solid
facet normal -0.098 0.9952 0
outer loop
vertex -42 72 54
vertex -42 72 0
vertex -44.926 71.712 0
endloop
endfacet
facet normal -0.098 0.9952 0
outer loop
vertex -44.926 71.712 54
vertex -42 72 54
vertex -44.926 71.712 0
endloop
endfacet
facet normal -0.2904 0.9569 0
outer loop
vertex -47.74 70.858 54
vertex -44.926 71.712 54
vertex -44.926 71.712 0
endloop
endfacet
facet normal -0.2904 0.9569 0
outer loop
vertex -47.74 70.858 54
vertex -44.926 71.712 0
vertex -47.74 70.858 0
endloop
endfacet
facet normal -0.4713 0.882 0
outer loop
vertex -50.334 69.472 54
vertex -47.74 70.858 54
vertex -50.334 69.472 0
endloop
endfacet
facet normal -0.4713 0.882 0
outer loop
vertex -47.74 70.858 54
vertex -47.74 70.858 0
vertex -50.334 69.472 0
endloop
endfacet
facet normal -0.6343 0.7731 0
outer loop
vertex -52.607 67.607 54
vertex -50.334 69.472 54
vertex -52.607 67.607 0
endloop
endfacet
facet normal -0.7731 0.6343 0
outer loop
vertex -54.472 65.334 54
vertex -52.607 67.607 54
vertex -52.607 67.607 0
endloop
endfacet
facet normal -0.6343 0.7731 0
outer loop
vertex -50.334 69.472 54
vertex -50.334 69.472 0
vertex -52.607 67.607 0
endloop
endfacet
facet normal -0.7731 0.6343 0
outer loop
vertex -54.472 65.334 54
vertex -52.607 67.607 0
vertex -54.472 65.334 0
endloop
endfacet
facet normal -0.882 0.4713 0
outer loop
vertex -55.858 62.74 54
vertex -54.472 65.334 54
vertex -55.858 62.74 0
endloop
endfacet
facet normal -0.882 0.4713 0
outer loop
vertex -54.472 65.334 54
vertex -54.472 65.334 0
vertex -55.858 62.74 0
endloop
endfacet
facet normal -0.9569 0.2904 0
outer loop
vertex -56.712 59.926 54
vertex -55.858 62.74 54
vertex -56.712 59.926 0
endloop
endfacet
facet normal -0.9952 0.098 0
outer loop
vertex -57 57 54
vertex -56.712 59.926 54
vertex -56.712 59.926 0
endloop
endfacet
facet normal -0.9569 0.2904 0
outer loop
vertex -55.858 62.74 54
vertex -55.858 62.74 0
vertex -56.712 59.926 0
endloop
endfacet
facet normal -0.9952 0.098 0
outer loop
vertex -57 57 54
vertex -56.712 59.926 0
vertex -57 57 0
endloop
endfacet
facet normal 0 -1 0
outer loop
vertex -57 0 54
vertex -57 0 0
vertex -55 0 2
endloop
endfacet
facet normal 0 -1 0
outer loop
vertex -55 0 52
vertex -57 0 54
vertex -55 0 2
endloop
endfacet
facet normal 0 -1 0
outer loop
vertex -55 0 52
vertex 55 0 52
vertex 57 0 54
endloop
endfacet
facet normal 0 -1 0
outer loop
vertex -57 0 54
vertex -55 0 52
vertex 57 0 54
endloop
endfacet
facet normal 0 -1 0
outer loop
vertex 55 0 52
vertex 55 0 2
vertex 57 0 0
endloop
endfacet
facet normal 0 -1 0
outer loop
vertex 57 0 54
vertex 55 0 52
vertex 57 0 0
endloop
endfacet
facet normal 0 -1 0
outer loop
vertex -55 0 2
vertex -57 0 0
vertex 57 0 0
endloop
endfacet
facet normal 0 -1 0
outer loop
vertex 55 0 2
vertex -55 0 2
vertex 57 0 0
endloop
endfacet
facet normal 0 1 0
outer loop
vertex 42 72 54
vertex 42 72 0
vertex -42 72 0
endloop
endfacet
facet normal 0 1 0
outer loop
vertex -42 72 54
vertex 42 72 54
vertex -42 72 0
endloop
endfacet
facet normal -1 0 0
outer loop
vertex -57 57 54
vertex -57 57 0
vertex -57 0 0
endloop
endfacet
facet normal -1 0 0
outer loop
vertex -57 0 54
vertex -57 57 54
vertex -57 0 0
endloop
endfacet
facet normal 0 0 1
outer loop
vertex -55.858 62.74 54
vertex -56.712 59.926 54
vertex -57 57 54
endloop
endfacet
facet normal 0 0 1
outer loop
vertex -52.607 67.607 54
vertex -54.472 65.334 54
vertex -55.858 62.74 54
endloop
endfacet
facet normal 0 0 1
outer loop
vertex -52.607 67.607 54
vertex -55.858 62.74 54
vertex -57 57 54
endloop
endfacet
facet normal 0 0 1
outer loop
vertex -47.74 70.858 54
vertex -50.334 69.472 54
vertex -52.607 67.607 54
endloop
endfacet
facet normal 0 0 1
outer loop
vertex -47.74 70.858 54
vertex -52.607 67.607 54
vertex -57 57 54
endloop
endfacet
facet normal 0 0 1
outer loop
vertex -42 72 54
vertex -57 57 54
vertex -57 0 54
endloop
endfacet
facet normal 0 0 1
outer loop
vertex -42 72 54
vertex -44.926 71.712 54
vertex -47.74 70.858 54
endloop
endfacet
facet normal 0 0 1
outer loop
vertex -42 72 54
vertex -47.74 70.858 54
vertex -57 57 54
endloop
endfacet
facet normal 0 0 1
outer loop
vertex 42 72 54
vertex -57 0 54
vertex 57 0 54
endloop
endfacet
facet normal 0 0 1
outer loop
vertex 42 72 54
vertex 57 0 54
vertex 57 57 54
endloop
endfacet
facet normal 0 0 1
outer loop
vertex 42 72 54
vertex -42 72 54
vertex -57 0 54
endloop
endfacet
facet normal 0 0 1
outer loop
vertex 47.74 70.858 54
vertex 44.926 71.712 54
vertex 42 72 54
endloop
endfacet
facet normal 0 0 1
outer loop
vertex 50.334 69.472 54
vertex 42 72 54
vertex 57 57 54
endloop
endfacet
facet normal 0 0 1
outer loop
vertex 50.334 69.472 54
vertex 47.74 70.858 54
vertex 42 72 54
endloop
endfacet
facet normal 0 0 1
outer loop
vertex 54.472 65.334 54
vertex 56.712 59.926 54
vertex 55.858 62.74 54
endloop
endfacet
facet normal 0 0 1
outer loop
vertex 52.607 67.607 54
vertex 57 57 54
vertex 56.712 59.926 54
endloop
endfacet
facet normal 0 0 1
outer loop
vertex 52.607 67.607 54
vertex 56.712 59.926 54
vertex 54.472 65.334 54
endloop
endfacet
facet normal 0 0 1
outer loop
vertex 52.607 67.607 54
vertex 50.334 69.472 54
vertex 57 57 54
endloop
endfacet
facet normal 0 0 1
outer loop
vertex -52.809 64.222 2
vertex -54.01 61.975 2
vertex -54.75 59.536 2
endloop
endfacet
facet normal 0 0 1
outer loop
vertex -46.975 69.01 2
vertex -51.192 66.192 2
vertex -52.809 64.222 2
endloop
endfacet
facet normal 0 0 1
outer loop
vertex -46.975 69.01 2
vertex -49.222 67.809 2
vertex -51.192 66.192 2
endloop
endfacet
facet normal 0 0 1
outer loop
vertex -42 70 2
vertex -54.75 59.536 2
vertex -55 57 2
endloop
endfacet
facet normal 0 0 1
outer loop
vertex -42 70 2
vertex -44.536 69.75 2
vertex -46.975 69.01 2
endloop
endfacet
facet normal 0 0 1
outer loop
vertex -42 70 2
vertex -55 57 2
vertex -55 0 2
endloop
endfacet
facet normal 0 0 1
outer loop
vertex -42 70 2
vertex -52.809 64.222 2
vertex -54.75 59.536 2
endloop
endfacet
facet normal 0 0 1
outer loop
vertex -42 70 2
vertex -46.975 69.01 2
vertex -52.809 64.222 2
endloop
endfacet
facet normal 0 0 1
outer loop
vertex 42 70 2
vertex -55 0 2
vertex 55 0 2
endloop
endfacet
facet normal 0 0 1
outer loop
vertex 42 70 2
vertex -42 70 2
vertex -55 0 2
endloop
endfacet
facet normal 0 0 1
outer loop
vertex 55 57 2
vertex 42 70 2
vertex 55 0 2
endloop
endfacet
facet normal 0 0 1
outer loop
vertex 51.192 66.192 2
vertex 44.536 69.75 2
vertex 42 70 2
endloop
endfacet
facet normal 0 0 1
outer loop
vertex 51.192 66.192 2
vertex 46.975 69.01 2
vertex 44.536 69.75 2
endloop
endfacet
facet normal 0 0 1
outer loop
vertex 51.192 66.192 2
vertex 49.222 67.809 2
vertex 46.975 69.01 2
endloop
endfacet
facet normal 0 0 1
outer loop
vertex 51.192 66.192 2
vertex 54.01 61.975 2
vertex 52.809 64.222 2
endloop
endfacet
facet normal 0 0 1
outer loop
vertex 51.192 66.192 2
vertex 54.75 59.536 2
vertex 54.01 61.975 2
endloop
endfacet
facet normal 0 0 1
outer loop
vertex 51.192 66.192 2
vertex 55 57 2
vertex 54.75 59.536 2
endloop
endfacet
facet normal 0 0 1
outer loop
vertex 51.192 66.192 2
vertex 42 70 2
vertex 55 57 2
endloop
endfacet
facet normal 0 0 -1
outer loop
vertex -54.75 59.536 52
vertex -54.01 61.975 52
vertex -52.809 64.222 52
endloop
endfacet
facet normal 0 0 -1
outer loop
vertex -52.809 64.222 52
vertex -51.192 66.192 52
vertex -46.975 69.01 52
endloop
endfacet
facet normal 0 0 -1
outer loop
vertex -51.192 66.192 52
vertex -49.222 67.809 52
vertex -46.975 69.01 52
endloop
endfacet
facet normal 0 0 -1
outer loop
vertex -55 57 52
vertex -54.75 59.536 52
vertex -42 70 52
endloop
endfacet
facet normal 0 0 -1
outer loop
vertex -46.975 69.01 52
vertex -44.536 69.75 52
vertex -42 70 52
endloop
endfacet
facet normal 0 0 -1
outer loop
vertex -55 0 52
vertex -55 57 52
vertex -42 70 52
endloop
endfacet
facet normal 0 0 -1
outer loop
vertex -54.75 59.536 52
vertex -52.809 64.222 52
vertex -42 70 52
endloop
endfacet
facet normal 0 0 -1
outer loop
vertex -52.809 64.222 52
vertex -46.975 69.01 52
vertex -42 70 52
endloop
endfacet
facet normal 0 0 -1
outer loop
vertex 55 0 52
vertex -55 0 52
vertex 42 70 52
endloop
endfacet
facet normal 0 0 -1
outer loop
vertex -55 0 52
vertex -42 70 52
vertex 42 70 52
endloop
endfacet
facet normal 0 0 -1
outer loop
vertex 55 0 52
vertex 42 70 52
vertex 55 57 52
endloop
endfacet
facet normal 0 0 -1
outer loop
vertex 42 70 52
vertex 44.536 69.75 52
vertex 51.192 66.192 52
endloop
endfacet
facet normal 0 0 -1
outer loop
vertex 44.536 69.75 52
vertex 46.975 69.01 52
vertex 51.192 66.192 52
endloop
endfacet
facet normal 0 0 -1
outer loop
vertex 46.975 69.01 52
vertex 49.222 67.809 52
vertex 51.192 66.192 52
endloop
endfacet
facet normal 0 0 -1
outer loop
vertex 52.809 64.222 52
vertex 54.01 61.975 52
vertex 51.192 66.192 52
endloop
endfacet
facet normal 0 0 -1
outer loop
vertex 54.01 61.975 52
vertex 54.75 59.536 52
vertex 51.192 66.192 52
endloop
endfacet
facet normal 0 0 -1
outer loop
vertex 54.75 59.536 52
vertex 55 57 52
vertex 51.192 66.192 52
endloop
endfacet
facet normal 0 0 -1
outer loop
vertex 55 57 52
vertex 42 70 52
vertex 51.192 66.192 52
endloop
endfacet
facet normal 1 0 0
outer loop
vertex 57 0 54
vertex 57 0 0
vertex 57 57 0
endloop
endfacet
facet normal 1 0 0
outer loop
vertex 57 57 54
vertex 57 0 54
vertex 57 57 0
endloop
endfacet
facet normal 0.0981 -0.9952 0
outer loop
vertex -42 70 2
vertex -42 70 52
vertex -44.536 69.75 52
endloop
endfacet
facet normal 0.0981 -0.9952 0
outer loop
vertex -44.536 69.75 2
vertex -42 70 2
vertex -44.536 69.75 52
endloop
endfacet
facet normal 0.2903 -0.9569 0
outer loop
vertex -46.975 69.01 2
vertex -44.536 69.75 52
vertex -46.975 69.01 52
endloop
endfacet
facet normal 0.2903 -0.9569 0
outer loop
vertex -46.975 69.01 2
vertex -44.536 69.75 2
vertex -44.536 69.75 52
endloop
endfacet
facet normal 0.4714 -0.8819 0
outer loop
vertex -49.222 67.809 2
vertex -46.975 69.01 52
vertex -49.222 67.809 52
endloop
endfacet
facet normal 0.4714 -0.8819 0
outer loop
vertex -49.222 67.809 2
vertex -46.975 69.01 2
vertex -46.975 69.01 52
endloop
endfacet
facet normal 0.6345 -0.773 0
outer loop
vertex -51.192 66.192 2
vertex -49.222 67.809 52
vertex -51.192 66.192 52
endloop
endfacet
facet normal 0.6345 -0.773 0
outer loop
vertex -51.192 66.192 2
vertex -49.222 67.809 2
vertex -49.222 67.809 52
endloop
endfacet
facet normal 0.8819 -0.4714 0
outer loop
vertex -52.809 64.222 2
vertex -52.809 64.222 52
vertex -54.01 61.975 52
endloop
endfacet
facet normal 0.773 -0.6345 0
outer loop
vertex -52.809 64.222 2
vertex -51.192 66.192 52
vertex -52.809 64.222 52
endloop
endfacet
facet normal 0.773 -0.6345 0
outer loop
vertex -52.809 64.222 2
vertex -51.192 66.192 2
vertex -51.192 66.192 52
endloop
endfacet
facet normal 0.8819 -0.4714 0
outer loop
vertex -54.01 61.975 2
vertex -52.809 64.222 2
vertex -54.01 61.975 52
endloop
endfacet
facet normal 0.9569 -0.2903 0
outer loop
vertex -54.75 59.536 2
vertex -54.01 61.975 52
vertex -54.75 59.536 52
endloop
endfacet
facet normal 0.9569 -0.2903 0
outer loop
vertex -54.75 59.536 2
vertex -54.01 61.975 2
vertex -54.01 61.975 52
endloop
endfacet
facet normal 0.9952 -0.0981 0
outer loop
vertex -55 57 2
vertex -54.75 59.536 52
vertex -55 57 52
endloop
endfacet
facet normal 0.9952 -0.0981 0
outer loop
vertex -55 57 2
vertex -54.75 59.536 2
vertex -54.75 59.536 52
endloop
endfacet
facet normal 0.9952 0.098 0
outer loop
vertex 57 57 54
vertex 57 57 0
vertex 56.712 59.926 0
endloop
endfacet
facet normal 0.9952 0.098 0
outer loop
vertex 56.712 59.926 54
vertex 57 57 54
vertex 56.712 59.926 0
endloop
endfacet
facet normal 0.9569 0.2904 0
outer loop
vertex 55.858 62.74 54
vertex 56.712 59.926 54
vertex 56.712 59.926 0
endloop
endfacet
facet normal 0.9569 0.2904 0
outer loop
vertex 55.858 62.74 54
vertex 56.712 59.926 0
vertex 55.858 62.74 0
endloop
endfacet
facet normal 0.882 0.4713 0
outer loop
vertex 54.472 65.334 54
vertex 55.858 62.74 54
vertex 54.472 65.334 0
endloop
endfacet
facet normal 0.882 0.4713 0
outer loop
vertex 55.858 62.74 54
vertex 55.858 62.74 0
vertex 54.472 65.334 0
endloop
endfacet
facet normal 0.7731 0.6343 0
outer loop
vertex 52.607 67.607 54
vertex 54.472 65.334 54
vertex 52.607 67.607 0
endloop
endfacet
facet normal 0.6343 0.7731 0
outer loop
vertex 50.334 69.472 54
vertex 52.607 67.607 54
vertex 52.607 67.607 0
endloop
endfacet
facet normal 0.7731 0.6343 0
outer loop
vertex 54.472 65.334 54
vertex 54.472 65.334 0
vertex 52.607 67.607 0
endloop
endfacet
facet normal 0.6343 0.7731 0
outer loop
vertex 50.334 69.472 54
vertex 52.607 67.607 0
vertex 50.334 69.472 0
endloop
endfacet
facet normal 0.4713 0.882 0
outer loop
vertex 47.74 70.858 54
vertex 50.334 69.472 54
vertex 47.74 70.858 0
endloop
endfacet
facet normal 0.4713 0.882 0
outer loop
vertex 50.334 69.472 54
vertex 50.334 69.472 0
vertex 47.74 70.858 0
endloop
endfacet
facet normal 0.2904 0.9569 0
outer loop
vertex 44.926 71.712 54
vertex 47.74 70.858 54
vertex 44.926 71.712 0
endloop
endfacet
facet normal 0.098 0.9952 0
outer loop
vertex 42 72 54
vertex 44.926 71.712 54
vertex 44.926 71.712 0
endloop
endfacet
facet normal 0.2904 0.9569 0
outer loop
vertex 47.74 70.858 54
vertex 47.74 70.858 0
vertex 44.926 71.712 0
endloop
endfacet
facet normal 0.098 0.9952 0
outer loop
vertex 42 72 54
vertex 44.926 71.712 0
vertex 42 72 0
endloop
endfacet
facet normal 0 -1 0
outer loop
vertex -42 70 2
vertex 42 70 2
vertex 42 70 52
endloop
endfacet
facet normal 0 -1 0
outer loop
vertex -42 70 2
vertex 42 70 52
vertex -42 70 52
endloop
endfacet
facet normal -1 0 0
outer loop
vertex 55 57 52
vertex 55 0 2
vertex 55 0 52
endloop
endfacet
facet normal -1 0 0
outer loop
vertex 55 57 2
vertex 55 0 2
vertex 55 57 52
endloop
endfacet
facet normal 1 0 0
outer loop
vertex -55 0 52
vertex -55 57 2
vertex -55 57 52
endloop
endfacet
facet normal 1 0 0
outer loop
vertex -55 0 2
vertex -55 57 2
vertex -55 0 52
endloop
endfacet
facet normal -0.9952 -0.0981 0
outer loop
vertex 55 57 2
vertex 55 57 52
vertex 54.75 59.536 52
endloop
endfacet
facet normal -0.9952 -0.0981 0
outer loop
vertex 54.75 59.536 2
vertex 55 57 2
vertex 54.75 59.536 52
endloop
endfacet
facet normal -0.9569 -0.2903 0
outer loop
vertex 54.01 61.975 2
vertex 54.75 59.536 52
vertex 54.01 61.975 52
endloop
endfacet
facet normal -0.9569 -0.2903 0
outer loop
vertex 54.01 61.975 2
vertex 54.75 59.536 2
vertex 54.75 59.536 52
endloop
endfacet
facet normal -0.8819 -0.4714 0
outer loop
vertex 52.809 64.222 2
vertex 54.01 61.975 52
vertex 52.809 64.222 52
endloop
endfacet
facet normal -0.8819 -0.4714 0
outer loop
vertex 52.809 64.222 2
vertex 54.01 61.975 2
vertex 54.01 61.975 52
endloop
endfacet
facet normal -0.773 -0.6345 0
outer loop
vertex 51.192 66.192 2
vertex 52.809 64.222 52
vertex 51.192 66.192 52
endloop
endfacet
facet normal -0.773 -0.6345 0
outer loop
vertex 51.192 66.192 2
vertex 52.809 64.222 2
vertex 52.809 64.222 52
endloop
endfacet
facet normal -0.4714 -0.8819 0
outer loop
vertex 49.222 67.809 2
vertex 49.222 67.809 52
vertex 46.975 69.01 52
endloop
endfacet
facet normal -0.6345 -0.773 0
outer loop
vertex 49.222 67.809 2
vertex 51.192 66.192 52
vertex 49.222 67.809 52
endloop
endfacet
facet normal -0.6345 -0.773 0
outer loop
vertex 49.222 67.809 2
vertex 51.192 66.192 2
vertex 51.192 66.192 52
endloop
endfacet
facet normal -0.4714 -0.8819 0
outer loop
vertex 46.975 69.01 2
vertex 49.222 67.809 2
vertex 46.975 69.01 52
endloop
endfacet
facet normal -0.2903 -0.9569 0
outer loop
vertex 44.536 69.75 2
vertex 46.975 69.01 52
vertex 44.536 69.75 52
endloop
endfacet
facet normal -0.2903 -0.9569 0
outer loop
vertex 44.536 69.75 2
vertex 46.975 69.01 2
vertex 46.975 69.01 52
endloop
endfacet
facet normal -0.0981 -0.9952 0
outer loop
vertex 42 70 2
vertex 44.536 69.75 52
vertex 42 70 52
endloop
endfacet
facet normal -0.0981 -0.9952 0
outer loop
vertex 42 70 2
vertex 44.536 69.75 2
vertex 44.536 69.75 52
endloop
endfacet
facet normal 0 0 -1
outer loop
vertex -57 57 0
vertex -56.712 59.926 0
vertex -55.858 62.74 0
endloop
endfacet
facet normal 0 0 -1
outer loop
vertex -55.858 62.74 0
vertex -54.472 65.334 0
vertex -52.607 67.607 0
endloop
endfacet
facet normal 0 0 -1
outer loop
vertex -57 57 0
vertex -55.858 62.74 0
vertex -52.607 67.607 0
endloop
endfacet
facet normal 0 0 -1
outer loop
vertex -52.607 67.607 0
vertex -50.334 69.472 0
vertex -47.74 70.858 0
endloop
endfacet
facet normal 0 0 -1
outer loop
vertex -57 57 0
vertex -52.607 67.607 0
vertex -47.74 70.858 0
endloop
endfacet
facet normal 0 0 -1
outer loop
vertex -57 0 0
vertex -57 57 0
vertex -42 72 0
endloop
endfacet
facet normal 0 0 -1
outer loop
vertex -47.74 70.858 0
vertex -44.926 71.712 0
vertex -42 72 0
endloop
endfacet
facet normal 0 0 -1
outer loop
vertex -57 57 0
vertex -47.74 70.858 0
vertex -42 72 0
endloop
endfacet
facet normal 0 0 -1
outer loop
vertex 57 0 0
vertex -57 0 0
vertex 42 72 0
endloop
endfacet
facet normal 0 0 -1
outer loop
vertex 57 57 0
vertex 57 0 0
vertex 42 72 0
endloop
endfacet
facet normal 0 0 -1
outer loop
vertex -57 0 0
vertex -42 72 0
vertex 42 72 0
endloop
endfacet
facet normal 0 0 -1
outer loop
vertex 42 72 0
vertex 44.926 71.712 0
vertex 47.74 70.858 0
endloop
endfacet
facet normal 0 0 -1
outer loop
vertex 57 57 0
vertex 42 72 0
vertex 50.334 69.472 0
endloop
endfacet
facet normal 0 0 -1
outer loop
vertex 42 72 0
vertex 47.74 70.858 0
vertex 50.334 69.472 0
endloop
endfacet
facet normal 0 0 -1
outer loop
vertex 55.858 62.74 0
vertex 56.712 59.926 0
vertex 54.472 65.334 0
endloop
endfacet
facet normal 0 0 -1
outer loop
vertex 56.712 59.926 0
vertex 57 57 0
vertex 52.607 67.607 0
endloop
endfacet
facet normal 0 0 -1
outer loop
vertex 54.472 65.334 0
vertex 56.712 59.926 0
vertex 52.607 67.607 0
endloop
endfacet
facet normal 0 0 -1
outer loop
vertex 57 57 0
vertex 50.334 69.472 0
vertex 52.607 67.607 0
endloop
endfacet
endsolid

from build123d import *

# Parameters (mm, degrees)
F1_DEPTH = 54
F2_T     = -2


with BuildPart() as f1:
    # F0 (on Top) → F1 (new body)
    with BuildSketch(Plane.XY):
        with BuildLine():
            Line((-57, 57), (-57, 0))
            Line((-57, 0), (0, 0))
            Line((0, 0), (57, 0))
            Line((57, 0), (57, 57))
            ThreePointArc((57, 57), (52.606602, 67.606602), (42, 72))
            Line((42, 72), (0, 72))
            Line((0, 72), (-42, 72))
            ThreePointArc((-42, 72), (-52.606602, 67.606602), (-57, 57))
        make_face()
    extrude(amount=F1_DEPTH)

    # F2
    f2_openings = [f1.faces().sort_by_distance(p)[0] for p in [
        (0, 0, 27),
    ]]
    offset(amount=F2_T, openings=f2_openings)


solid = f1.part
